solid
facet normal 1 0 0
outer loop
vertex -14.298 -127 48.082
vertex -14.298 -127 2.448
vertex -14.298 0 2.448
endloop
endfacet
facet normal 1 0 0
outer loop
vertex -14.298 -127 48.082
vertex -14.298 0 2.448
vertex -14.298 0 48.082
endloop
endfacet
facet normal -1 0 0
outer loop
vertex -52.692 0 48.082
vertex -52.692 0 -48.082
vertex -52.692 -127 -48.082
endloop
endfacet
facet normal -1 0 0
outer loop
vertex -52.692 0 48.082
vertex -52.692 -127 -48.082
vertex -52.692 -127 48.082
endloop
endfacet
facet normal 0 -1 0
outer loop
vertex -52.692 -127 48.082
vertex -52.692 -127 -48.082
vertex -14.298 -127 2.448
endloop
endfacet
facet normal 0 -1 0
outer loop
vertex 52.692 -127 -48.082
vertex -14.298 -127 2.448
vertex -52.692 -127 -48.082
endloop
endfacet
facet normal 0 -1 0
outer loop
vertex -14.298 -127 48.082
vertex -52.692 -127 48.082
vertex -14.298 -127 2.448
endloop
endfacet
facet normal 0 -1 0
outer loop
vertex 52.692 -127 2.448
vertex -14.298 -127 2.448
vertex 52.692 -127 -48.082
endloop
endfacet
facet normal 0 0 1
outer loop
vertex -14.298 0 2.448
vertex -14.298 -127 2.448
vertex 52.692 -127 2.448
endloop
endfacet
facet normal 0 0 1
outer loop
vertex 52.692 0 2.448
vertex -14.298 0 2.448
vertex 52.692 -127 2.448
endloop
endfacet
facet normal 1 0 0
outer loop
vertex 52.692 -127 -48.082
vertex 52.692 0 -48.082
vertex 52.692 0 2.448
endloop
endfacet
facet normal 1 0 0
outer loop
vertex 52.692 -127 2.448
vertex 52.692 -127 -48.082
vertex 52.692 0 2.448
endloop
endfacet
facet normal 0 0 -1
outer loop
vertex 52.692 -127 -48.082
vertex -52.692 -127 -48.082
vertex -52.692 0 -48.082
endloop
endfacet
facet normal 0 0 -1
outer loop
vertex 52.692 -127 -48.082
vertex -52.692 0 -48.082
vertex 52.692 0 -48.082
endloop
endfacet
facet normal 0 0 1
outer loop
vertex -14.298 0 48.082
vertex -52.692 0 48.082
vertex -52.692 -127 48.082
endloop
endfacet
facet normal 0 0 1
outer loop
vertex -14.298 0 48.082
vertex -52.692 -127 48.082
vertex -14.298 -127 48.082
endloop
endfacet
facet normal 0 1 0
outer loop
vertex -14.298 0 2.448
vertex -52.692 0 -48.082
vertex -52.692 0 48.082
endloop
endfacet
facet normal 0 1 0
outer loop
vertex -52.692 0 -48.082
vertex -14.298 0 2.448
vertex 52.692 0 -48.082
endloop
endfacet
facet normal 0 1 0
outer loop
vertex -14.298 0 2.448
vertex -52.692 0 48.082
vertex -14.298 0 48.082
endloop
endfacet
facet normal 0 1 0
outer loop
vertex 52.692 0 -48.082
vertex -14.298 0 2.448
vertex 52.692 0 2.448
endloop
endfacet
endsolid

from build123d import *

# Parameters (mm, degrees)
F0_W     = 105.3846
F0_H     = 96.1644
F1_DEPTH = 127
F2_W     = 66.9902929224
F2_H     = 45.6339136045
F3_DEPTH = 155.194


with BuildPart() as f1:
    # F0 (on Front) → F1 (new body)
    with BuildSketch(Plane.XZ):
        Rectangle(F0_W, F0_H)
    extrude(amount=F1_DEPTH)

    # F2 (on face) → F3 (cut, symmetric)
    with BuildSketch(Plane.XZ.offset(127)):
        with Locations((19.1971535388, 25.2652431978)):
            Rectangle(F2_W, F2_H)
    extrude(amount=F3_DEPTH, both=True, mode=Mode.SUBTRACT)


solid = f1.part
